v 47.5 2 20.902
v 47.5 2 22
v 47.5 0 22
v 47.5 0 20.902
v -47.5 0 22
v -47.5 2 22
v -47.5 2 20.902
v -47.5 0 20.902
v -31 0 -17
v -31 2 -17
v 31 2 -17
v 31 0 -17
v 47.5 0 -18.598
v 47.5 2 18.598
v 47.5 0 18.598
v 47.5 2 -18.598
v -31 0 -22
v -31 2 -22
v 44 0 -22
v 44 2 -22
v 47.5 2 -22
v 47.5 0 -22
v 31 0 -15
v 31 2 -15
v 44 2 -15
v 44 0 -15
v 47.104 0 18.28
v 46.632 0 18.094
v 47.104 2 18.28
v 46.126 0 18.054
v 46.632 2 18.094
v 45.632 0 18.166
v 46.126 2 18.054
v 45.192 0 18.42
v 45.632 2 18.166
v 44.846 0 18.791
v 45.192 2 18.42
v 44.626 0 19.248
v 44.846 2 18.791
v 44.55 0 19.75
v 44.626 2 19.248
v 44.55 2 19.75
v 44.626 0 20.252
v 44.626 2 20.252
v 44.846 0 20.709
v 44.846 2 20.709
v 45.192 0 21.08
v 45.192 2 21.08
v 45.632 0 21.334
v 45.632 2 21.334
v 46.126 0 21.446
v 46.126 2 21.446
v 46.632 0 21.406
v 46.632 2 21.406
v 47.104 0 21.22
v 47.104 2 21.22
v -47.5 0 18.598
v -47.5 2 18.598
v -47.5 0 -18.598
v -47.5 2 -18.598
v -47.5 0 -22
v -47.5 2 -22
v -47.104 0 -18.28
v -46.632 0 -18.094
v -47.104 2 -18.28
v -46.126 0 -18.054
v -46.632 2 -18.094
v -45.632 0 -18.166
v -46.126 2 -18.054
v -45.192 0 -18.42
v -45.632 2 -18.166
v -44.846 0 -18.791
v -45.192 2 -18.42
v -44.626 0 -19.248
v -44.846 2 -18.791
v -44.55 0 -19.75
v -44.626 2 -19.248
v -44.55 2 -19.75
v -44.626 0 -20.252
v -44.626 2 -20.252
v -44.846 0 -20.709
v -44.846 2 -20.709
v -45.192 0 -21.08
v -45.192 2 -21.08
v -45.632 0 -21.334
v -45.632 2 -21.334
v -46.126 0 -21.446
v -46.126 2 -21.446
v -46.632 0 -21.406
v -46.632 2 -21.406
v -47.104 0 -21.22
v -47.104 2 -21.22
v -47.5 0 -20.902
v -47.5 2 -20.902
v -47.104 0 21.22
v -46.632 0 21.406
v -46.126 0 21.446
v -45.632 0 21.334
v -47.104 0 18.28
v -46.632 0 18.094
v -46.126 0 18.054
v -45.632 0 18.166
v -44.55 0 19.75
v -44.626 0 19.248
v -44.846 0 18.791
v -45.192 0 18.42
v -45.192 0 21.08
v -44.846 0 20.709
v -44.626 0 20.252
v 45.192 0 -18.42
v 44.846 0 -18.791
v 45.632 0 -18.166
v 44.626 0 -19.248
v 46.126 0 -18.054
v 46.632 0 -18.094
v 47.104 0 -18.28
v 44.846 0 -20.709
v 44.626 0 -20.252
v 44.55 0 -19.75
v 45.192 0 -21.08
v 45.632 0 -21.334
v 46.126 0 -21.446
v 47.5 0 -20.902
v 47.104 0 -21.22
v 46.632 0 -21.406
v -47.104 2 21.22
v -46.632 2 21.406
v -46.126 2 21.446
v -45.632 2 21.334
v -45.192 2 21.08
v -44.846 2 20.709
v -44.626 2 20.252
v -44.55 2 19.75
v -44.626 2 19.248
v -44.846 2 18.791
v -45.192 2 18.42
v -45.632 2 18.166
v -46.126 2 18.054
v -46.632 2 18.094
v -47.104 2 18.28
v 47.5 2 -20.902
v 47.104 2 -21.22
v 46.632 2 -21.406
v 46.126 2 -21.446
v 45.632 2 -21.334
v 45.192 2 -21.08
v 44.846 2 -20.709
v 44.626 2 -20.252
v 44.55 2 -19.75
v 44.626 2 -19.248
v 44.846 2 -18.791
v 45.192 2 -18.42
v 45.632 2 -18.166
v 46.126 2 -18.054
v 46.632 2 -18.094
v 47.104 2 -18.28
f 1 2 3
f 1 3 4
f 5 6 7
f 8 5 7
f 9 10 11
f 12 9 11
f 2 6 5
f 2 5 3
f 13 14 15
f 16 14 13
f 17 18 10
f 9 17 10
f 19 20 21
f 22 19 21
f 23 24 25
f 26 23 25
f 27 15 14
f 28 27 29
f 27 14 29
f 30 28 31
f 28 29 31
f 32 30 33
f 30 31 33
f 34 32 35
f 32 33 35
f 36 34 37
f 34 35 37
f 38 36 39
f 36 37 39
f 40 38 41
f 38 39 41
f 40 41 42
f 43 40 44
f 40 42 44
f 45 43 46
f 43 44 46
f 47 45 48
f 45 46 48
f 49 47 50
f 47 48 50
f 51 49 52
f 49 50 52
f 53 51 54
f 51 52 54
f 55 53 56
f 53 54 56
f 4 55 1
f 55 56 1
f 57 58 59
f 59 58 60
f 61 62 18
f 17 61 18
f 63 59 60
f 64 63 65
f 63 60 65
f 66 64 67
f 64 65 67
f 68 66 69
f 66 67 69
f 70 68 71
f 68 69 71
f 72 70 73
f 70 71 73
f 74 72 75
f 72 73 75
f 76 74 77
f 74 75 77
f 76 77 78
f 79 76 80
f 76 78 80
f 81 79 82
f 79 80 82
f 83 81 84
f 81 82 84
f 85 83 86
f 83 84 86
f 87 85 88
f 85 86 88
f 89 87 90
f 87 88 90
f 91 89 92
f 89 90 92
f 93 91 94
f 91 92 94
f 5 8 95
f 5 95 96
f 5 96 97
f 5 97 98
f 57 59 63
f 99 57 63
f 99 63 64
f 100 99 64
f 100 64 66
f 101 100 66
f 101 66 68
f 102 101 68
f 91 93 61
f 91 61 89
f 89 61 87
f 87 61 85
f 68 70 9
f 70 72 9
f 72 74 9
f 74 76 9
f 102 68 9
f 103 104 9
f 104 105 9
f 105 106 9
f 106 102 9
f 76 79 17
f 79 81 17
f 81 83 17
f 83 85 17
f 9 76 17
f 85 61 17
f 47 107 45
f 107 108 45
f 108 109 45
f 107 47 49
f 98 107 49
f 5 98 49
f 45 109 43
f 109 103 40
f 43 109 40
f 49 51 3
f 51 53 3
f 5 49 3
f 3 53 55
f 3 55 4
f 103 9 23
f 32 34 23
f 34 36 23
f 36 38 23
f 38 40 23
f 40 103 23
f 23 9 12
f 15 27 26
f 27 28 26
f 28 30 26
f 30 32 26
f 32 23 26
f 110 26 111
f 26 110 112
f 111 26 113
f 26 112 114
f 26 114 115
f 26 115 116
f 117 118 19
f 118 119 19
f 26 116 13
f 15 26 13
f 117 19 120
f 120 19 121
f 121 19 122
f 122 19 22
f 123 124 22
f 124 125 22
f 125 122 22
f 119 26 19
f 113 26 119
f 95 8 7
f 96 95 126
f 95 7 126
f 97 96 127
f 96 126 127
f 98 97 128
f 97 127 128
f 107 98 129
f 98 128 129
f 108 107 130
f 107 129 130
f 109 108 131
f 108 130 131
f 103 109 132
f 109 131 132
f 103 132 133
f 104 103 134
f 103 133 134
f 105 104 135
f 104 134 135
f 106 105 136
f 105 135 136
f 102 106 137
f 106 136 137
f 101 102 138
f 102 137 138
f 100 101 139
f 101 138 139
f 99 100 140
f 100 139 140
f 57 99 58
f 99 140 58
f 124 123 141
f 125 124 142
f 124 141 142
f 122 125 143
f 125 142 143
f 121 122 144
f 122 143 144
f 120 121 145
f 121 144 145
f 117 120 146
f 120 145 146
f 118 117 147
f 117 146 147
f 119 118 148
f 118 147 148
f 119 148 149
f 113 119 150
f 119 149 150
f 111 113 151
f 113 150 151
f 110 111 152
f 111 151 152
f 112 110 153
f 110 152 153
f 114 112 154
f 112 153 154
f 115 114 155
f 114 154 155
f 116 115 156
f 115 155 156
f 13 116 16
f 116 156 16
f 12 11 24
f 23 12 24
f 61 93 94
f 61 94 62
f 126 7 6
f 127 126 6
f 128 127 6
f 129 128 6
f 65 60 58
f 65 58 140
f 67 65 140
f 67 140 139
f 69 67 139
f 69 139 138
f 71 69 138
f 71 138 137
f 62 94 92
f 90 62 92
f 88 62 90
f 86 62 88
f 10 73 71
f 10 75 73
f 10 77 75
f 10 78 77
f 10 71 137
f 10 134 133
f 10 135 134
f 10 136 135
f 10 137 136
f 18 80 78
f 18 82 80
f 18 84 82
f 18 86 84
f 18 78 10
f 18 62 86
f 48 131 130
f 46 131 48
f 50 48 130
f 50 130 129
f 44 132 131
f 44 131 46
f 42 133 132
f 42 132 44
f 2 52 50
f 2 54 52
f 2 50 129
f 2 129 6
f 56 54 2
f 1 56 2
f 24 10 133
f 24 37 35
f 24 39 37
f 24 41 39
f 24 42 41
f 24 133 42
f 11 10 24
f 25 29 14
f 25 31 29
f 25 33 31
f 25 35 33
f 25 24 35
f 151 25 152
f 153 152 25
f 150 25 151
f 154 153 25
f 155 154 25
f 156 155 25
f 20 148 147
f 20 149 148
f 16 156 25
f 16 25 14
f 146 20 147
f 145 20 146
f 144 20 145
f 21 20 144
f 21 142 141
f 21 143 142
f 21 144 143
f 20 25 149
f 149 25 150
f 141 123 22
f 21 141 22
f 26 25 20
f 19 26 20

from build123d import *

# Parameters (mm, degrees)
SKETCH2_W           = 102
SKETCH2_H           = 50
BOSS_EXTRUDE2_DEPTH = 2
SKETCH1_W           = 98
SKETCH1_H           = 46
BOSS_EXTRUDE1_DEPTH = 2
FILLET1_R           = 2
SKETCH3_R           = 1
CUT_EXTRUDE1_DEPTH  = 1.6
CUT_EXTRUDE2_DEPTH  = 4
SKETCH5_OUTSIDE_W   = 126.722
SKETCH5_OUTSIDE_H   = 74.722
SKETCH5_OUTSIDE_W_2 = 95
SKETCH5_OUTSIDE_H_2 = 44
CUT_EXTRUDE3_DEPTH  = 10
SKETCH6_R           = 0.25
CUT_EXTRUDE4_DEPTH  = 10
SKETCH7_R           = 1.7
CUT_EXTRUDE5_DEPTH  = 10


with BuildPart() as part:
    # Sketch2 → Boss-Extrude2 (new body)
    with BuildSketch(Plane(origin=(0, 0, 0), x_dir=(1, 0, 0), z_dir=(0, 1, 0))):
        Rectangle(SKETCH2_W, SKETCH2_H)
    extrude(amount=BOSS_EXTRUDE2_DEPTH)

    # Sketch1 → Boss-Extrude1 (add)
    with BuildSketch(Plane(origin=(0, 0, 0), x_dir=(1, 0, 0), z_dir=(0, 1, 0))):
        Rectangle(SKETCH1_W, SKETCH1_H)
    extrude(amount=BOSS_EXTRUDE1_DEPTH)

    # Fillet1
    fillet1_edges = [part.edges().sort_by_distance(p)[0] for p in [
        (-51, 1, 25),
        (-51, 1, -25),
        (51, 1, -25),
        (51, 1, 25),
    ]]
    fillet(fillet1_edges, radius=FILLET1_R)

    # Sketch3 → Cut-Extrude1 (cut)
    with BuildSketch(Plane(origin=(0, 2, 0), x_dir=(1, 0, 0), z_dir=(0, 1, 0))):
        with Locations((-46.25, -19.75)):
            Circle(SKETCH3_R)
        with Locations((46.25, -19.75)):
            Circle(SKETCH3_R)
        with Locations((-46.25, 19.75)):
            Circle(SKETCH3_R)
        with Locations((46.25, 19.75)):
            Circle(SKETCH3_R)
    extrude(amount=-CUT_EXTRUDE1_DEPTH, mode=Mode.SUBTRACT)

    # Sketch4 → Cut-Extrude2 (cut)
    with BuildSketch(Plane(origin=(0, 2, 0), x_dir=(1, 0, 0), z_dir=(0, 1, 0))):
        Polygon((-31, 25), (-31, 21), (-31, 17), (-16, 17), (31, 17), (31, 15), (44, 15), (44, 19), (44, 25), align=None)
    extrude(amount=-CUT_EXTRUDE2_DEPTH, mode=Mode.SUBTRACT)

    # Sketch5 outside → Cut-Extrude3 (cut)
    with BuildSketch(Plane(origin=(0, 2, 0), x_dir=(1, 0, 0), z_dir=(0, 1, 0))):
        Rectangle(SKETCH5_OUTSIDE_W, SKETCH5_OUTSIDE_H)
        Rectangle(SKETCH5_OUTSIDE_W_2, SKETCH5_OUTSIDE_H_2, mode=Mode.SUBTRACT)
    extrude(amount=-CUT_EXTRUDE3_DEPTH, mode=Mode.SUBTRACT)

    # Sketch6 → Cut-Extrude4 (cut)
    with BuildSketch(Plane(origin=(0, 0.4, 0), x_dir=(1, 0, 0), z_dir=(0, 1, 0))):
        with Locations((-46.25, 19.75)):
            Circle(SKETCH6_R)
        with Locations((-46.25, -19.75)):
            Circle(SKETCH6_R)
        with Locations((46.25, 19.75)):
            Circle(SKETCH6_R)
        with Locations((46.25, -19.75)):
            Circle(SKETCH6_R)
    extrude(amount=-CUT_EXTRUDE4_DEPTH, mode=Mode.SUBTRACT)

    # Sketch7 → Cut-Extrude5 (cut)
    with BuildSketch(Plane(origin=(0, 2, 0), x_dir=(1, 0, 0), z_dir=(0, 1, 0))):
        with Locations((-46.25, -19.75)):
            Circle(SKETCH7_R)
        with Locations((-46.25, 19.75)):
            Circle(SKETCH7_R)
        with Locations((46.25, 19.75)):
            Circle(SKETCH7_R)
        with Locations((46.25, -19.75)):
            Circle(SKETCH7_R)
    extrude(amount=-CUT_EXTRUDE5_DEPTH, mode=Mode.SUBTRACT)


solid = part.part
